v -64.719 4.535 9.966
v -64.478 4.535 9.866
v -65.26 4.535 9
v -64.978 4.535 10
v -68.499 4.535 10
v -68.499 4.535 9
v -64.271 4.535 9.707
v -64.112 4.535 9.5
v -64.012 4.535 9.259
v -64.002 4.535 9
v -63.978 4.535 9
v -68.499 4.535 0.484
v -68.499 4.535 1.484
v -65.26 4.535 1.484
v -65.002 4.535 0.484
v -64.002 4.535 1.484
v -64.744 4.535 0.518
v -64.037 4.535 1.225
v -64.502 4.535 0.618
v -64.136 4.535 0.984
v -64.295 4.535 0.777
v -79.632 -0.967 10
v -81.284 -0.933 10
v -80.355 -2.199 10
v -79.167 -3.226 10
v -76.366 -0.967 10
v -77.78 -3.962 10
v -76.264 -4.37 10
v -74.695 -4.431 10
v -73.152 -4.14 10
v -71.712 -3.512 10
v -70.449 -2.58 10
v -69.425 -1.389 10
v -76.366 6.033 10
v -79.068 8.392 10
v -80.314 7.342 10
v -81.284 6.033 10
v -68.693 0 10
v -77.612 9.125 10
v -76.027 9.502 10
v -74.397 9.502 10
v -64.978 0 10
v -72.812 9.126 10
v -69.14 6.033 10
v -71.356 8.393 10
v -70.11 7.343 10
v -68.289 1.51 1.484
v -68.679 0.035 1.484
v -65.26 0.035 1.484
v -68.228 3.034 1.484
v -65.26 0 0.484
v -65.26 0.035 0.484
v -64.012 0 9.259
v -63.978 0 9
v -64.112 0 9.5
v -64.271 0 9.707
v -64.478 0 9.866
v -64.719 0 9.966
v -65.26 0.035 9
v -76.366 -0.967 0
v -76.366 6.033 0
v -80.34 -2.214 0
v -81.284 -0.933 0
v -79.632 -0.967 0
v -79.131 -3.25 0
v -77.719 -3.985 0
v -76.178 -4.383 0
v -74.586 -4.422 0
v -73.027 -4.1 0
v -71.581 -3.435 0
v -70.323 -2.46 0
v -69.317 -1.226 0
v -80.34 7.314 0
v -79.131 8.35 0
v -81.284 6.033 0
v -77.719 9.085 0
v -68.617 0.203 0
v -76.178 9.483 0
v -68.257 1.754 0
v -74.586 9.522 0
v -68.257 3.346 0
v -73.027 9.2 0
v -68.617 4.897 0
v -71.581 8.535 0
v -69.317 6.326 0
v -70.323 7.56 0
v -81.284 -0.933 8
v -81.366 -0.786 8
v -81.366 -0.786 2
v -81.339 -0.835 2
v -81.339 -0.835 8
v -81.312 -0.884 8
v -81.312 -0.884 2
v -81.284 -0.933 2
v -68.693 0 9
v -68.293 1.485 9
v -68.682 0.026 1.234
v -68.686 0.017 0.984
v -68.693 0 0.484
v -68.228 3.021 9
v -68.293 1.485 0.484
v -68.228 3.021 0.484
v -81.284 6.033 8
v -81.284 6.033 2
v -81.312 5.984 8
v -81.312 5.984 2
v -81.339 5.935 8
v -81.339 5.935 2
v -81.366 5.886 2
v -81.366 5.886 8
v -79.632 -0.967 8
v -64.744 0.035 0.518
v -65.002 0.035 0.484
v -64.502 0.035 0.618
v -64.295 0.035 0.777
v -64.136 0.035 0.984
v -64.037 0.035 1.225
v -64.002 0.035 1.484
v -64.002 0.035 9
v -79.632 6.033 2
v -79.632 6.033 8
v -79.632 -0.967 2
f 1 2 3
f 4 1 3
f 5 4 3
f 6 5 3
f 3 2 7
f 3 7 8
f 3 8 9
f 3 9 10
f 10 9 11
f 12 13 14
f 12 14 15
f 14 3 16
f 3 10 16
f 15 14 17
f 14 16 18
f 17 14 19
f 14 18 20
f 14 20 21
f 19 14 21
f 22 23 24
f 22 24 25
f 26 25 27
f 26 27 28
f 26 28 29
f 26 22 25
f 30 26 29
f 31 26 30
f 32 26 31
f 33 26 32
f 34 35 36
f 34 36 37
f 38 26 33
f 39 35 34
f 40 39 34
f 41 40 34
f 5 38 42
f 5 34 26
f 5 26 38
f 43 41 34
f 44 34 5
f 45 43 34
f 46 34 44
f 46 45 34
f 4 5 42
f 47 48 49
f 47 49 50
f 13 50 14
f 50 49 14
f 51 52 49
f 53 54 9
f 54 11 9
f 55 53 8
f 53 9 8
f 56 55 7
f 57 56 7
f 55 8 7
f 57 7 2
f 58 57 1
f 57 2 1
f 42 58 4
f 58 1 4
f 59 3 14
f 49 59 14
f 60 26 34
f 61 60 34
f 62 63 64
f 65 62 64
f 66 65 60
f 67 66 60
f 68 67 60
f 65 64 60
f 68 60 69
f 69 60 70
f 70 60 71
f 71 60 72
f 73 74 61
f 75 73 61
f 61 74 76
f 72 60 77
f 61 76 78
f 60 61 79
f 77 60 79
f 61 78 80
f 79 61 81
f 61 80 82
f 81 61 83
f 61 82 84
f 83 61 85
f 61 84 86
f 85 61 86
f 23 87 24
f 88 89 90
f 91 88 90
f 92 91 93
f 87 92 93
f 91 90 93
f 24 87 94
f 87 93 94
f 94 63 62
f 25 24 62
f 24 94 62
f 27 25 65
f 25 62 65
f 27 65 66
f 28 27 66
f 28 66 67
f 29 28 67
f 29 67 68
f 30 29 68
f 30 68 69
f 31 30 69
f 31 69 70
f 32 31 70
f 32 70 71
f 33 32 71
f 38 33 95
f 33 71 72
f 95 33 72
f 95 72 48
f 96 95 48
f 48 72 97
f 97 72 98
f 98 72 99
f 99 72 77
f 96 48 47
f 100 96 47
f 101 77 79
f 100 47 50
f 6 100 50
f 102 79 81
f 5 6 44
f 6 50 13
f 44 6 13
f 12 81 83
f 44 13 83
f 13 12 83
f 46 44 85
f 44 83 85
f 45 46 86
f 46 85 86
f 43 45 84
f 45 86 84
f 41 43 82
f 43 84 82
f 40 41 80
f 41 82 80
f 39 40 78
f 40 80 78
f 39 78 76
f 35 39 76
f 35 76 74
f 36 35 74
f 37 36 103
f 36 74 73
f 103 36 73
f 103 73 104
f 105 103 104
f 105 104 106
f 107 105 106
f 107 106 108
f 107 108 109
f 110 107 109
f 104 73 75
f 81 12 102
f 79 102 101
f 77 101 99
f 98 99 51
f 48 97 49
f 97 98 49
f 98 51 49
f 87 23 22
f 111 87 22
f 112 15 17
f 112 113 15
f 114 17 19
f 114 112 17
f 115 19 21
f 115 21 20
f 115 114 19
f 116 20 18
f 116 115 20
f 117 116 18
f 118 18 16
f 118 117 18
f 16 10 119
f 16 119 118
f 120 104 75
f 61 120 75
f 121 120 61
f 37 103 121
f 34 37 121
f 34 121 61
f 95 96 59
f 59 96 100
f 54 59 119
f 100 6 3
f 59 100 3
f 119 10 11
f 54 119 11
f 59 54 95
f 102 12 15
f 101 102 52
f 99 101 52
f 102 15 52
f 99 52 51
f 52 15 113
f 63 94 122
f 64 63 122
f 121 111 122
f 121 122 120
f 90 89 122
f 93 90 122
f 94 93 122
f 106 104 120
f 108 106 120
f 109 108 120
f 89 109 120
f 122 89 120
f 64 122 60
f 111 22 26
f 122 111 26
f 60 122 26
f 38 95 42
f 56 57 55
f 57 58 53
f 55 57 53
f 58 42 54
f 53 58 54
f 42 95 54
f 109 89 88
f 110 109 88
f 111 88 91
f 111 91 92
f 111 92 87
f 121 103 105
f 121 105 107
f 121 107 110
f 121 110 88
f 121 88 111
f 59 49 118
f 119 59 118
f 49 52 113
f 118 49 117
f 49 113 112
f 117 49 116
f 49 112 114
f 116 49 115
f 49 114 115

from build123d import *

# Parameters (mm, degrees)
SKETCH_1_R          = 7
EXTRUDE_1_DEPTH     = 10
SKETCH_9_W          = 5.615402883
SKETCH_9_H          = 4.534999238
EXTRUDE_6_DEPTH     = 1
SKETCH_11_W         = 1.257653538
SKETCH_11_H         = 9
EXTRUDE_7_DEPTH     = 4.5
EXTRUDE_8_DEPTH     = 6
FILLET_8_R          = 1
FILLET_9_R          = 1
SKETCH_14_W         = 3.266646727
SKETCH_14_H         = 7
CUT_EXTRUDE_1_DEPTH = 10
CUT_EXTRUDE_START   = -2
CUT_EXTRUDE_2_DEPTH = 2
CUT_EXTRUDE_3_DEPTH = 2
SKETCH_17_W         = 6
SKETCH_17_H         = 6.96519698
CUT_EXTRUDE_5_DEPTH = 2


with BuildPart() as part:
    # 草圖1 → 填料-伸長1 (new body)
    with BuildSketch(Plane(origin=(0.382706605, 0, 0), x_dir=(1, 0, 0), z_dir=(0, 0, 1))):
        with Locations((-75.594417438, 2.55)):
            Circle(SKETCH_1_R)
    extrude(amount=EXTRUDE_1_DEPTH)

    # 草圖9 → 填料-伸長6 (add)
    with BuildSketch(Plane(origin=(8.106794936, 0, 9), x_dir=(1, 0, 0), z_dir=(0, 0, 1))):
        with Locations((-74.892231202, 2.267499619)):
            Rectangle(SKETCH_9_W, SKETCH_9_H)
    extrude(amount=EXTRUDE_6_DEPTH)



with BuildPart() as body_2:
    # 草圖11 → 填料-伸長7 (new body)
    with BuildSketch(Plane(origin=(11.553490323, 4.534999238, 0.48426017), x_dir=(1, 0, 0), z_dir=(0, 1, 0))):
        with Locations((-76.184774061, -4.5)):
            Rectangle(SKETCH_11_W, SKETCH_11_H)
    extrude(amount=-EXTRUDE_7_DEPTH)


with BuildPart() as part_1:
    add(part.part)

    add(body_2.part)  # 填料-伸長8 merges body 2
    # 草圖12 → 填料-伸長8 (add)
    with BuildSketch(Plane.ZY.offset(65.260110507)):
        Polygon((0.48426017, 4.534999238), (0.48426017, 0), (1.483647509, 0.034999238), (1.483647509, 4.534999238), align=None)
    extrude(amount=EXTRUDE_8_DEPTH)

    # 圓角8
    fillet_8_edges = [part_1.edges().sort_by_distance(p)[0] for p in [
        (-64.002456969, 2.284999238, 0.48426017),
    ]]
    fillet(fillet_8_edges, radius=FILLET_8_R)

    # 圓角9
    fillet_9_edges = [part_1.edges().sort_by_distance(p)[0] for p in [
        (-63.977734824, 2.267499619, 10),
    ]]
    fillet(fillet_9_edges, radius=FILLET_9_R - 0.0001)  # a hair under: the kernel refuses the full size

    # 草圖14 → 除料-伸長1 (cut)
    with BuildSketch(Plane.XY.offset(10)):
        with Locations((-77.998959421, 2.53259849)):
            Rectangle(SKETCH_14_W, SKETCH_14_H)
    extrude(amount=-CUT_EXTRUDE_1_DEPTH, mode=Mode.SUBTRACT)

    # 草圖15 → 除料-伸長2 (cut)
    with BuildSketch(Plane.XY.offset(10).offset(CUT_EXTRUDE_START)):
        with BuildLine():
            Line((-79.632282784, 6.03259849), (-81.28390218, 6.03259849))
            ThreePointArc((-81.28390218, 6.03259849), (-82.211710833, 2.55), (-81.28390218, -0.93259849))
            Line((-81.28390218, -0.93259849), (-79.632282784, -0.96740151))
            Line((-79.632282784, -0.96740151), (-79.632282784, 6.03259849))
        make_face()
    extrude(amount=CUT_EXTRUDE_2_DEPTH, mode=Mode.SUBTRACT)

    # 草圖16 → 除料-伸長3 (cut)
    with BuildSketch(Plane(origin=(0, 0, 0), x_dir=(-1, 0, 0), z_dir=(0, 0, -1))):
        with BuildLine():
            Line((79.632282784, 6.03259849), (81.28390218, 6.03259849))
            ThreePointArc((81.28390218, 6.03259849), (82.211710833, 2.55), (81.28390218, -0.93259849))
            Line((81.28390218, -0.93259849), (79.632282784, -0.96740151))
            Line((79.632282784, -0.96740151), (79.632282784, 6.03259849))
        make_face()
    extrude(amount=-CUT_EXTRUDE_3_DEPTH, mode=Mode.SUBTRACT)

    # 草圖17 → 除料-伸長5 (cut)
    with BuildSketch(Plane.ZY.offset(83.365636057)):
        with Locations((5, 2.55)):
            Rectangle(SKETCH_17_W, SKETCH_17_H)
    extrude(amount=-CUT_EXTRUDE_5_DEPTH, mode=Mode.SUBTRACT)


solid = part_1.part
